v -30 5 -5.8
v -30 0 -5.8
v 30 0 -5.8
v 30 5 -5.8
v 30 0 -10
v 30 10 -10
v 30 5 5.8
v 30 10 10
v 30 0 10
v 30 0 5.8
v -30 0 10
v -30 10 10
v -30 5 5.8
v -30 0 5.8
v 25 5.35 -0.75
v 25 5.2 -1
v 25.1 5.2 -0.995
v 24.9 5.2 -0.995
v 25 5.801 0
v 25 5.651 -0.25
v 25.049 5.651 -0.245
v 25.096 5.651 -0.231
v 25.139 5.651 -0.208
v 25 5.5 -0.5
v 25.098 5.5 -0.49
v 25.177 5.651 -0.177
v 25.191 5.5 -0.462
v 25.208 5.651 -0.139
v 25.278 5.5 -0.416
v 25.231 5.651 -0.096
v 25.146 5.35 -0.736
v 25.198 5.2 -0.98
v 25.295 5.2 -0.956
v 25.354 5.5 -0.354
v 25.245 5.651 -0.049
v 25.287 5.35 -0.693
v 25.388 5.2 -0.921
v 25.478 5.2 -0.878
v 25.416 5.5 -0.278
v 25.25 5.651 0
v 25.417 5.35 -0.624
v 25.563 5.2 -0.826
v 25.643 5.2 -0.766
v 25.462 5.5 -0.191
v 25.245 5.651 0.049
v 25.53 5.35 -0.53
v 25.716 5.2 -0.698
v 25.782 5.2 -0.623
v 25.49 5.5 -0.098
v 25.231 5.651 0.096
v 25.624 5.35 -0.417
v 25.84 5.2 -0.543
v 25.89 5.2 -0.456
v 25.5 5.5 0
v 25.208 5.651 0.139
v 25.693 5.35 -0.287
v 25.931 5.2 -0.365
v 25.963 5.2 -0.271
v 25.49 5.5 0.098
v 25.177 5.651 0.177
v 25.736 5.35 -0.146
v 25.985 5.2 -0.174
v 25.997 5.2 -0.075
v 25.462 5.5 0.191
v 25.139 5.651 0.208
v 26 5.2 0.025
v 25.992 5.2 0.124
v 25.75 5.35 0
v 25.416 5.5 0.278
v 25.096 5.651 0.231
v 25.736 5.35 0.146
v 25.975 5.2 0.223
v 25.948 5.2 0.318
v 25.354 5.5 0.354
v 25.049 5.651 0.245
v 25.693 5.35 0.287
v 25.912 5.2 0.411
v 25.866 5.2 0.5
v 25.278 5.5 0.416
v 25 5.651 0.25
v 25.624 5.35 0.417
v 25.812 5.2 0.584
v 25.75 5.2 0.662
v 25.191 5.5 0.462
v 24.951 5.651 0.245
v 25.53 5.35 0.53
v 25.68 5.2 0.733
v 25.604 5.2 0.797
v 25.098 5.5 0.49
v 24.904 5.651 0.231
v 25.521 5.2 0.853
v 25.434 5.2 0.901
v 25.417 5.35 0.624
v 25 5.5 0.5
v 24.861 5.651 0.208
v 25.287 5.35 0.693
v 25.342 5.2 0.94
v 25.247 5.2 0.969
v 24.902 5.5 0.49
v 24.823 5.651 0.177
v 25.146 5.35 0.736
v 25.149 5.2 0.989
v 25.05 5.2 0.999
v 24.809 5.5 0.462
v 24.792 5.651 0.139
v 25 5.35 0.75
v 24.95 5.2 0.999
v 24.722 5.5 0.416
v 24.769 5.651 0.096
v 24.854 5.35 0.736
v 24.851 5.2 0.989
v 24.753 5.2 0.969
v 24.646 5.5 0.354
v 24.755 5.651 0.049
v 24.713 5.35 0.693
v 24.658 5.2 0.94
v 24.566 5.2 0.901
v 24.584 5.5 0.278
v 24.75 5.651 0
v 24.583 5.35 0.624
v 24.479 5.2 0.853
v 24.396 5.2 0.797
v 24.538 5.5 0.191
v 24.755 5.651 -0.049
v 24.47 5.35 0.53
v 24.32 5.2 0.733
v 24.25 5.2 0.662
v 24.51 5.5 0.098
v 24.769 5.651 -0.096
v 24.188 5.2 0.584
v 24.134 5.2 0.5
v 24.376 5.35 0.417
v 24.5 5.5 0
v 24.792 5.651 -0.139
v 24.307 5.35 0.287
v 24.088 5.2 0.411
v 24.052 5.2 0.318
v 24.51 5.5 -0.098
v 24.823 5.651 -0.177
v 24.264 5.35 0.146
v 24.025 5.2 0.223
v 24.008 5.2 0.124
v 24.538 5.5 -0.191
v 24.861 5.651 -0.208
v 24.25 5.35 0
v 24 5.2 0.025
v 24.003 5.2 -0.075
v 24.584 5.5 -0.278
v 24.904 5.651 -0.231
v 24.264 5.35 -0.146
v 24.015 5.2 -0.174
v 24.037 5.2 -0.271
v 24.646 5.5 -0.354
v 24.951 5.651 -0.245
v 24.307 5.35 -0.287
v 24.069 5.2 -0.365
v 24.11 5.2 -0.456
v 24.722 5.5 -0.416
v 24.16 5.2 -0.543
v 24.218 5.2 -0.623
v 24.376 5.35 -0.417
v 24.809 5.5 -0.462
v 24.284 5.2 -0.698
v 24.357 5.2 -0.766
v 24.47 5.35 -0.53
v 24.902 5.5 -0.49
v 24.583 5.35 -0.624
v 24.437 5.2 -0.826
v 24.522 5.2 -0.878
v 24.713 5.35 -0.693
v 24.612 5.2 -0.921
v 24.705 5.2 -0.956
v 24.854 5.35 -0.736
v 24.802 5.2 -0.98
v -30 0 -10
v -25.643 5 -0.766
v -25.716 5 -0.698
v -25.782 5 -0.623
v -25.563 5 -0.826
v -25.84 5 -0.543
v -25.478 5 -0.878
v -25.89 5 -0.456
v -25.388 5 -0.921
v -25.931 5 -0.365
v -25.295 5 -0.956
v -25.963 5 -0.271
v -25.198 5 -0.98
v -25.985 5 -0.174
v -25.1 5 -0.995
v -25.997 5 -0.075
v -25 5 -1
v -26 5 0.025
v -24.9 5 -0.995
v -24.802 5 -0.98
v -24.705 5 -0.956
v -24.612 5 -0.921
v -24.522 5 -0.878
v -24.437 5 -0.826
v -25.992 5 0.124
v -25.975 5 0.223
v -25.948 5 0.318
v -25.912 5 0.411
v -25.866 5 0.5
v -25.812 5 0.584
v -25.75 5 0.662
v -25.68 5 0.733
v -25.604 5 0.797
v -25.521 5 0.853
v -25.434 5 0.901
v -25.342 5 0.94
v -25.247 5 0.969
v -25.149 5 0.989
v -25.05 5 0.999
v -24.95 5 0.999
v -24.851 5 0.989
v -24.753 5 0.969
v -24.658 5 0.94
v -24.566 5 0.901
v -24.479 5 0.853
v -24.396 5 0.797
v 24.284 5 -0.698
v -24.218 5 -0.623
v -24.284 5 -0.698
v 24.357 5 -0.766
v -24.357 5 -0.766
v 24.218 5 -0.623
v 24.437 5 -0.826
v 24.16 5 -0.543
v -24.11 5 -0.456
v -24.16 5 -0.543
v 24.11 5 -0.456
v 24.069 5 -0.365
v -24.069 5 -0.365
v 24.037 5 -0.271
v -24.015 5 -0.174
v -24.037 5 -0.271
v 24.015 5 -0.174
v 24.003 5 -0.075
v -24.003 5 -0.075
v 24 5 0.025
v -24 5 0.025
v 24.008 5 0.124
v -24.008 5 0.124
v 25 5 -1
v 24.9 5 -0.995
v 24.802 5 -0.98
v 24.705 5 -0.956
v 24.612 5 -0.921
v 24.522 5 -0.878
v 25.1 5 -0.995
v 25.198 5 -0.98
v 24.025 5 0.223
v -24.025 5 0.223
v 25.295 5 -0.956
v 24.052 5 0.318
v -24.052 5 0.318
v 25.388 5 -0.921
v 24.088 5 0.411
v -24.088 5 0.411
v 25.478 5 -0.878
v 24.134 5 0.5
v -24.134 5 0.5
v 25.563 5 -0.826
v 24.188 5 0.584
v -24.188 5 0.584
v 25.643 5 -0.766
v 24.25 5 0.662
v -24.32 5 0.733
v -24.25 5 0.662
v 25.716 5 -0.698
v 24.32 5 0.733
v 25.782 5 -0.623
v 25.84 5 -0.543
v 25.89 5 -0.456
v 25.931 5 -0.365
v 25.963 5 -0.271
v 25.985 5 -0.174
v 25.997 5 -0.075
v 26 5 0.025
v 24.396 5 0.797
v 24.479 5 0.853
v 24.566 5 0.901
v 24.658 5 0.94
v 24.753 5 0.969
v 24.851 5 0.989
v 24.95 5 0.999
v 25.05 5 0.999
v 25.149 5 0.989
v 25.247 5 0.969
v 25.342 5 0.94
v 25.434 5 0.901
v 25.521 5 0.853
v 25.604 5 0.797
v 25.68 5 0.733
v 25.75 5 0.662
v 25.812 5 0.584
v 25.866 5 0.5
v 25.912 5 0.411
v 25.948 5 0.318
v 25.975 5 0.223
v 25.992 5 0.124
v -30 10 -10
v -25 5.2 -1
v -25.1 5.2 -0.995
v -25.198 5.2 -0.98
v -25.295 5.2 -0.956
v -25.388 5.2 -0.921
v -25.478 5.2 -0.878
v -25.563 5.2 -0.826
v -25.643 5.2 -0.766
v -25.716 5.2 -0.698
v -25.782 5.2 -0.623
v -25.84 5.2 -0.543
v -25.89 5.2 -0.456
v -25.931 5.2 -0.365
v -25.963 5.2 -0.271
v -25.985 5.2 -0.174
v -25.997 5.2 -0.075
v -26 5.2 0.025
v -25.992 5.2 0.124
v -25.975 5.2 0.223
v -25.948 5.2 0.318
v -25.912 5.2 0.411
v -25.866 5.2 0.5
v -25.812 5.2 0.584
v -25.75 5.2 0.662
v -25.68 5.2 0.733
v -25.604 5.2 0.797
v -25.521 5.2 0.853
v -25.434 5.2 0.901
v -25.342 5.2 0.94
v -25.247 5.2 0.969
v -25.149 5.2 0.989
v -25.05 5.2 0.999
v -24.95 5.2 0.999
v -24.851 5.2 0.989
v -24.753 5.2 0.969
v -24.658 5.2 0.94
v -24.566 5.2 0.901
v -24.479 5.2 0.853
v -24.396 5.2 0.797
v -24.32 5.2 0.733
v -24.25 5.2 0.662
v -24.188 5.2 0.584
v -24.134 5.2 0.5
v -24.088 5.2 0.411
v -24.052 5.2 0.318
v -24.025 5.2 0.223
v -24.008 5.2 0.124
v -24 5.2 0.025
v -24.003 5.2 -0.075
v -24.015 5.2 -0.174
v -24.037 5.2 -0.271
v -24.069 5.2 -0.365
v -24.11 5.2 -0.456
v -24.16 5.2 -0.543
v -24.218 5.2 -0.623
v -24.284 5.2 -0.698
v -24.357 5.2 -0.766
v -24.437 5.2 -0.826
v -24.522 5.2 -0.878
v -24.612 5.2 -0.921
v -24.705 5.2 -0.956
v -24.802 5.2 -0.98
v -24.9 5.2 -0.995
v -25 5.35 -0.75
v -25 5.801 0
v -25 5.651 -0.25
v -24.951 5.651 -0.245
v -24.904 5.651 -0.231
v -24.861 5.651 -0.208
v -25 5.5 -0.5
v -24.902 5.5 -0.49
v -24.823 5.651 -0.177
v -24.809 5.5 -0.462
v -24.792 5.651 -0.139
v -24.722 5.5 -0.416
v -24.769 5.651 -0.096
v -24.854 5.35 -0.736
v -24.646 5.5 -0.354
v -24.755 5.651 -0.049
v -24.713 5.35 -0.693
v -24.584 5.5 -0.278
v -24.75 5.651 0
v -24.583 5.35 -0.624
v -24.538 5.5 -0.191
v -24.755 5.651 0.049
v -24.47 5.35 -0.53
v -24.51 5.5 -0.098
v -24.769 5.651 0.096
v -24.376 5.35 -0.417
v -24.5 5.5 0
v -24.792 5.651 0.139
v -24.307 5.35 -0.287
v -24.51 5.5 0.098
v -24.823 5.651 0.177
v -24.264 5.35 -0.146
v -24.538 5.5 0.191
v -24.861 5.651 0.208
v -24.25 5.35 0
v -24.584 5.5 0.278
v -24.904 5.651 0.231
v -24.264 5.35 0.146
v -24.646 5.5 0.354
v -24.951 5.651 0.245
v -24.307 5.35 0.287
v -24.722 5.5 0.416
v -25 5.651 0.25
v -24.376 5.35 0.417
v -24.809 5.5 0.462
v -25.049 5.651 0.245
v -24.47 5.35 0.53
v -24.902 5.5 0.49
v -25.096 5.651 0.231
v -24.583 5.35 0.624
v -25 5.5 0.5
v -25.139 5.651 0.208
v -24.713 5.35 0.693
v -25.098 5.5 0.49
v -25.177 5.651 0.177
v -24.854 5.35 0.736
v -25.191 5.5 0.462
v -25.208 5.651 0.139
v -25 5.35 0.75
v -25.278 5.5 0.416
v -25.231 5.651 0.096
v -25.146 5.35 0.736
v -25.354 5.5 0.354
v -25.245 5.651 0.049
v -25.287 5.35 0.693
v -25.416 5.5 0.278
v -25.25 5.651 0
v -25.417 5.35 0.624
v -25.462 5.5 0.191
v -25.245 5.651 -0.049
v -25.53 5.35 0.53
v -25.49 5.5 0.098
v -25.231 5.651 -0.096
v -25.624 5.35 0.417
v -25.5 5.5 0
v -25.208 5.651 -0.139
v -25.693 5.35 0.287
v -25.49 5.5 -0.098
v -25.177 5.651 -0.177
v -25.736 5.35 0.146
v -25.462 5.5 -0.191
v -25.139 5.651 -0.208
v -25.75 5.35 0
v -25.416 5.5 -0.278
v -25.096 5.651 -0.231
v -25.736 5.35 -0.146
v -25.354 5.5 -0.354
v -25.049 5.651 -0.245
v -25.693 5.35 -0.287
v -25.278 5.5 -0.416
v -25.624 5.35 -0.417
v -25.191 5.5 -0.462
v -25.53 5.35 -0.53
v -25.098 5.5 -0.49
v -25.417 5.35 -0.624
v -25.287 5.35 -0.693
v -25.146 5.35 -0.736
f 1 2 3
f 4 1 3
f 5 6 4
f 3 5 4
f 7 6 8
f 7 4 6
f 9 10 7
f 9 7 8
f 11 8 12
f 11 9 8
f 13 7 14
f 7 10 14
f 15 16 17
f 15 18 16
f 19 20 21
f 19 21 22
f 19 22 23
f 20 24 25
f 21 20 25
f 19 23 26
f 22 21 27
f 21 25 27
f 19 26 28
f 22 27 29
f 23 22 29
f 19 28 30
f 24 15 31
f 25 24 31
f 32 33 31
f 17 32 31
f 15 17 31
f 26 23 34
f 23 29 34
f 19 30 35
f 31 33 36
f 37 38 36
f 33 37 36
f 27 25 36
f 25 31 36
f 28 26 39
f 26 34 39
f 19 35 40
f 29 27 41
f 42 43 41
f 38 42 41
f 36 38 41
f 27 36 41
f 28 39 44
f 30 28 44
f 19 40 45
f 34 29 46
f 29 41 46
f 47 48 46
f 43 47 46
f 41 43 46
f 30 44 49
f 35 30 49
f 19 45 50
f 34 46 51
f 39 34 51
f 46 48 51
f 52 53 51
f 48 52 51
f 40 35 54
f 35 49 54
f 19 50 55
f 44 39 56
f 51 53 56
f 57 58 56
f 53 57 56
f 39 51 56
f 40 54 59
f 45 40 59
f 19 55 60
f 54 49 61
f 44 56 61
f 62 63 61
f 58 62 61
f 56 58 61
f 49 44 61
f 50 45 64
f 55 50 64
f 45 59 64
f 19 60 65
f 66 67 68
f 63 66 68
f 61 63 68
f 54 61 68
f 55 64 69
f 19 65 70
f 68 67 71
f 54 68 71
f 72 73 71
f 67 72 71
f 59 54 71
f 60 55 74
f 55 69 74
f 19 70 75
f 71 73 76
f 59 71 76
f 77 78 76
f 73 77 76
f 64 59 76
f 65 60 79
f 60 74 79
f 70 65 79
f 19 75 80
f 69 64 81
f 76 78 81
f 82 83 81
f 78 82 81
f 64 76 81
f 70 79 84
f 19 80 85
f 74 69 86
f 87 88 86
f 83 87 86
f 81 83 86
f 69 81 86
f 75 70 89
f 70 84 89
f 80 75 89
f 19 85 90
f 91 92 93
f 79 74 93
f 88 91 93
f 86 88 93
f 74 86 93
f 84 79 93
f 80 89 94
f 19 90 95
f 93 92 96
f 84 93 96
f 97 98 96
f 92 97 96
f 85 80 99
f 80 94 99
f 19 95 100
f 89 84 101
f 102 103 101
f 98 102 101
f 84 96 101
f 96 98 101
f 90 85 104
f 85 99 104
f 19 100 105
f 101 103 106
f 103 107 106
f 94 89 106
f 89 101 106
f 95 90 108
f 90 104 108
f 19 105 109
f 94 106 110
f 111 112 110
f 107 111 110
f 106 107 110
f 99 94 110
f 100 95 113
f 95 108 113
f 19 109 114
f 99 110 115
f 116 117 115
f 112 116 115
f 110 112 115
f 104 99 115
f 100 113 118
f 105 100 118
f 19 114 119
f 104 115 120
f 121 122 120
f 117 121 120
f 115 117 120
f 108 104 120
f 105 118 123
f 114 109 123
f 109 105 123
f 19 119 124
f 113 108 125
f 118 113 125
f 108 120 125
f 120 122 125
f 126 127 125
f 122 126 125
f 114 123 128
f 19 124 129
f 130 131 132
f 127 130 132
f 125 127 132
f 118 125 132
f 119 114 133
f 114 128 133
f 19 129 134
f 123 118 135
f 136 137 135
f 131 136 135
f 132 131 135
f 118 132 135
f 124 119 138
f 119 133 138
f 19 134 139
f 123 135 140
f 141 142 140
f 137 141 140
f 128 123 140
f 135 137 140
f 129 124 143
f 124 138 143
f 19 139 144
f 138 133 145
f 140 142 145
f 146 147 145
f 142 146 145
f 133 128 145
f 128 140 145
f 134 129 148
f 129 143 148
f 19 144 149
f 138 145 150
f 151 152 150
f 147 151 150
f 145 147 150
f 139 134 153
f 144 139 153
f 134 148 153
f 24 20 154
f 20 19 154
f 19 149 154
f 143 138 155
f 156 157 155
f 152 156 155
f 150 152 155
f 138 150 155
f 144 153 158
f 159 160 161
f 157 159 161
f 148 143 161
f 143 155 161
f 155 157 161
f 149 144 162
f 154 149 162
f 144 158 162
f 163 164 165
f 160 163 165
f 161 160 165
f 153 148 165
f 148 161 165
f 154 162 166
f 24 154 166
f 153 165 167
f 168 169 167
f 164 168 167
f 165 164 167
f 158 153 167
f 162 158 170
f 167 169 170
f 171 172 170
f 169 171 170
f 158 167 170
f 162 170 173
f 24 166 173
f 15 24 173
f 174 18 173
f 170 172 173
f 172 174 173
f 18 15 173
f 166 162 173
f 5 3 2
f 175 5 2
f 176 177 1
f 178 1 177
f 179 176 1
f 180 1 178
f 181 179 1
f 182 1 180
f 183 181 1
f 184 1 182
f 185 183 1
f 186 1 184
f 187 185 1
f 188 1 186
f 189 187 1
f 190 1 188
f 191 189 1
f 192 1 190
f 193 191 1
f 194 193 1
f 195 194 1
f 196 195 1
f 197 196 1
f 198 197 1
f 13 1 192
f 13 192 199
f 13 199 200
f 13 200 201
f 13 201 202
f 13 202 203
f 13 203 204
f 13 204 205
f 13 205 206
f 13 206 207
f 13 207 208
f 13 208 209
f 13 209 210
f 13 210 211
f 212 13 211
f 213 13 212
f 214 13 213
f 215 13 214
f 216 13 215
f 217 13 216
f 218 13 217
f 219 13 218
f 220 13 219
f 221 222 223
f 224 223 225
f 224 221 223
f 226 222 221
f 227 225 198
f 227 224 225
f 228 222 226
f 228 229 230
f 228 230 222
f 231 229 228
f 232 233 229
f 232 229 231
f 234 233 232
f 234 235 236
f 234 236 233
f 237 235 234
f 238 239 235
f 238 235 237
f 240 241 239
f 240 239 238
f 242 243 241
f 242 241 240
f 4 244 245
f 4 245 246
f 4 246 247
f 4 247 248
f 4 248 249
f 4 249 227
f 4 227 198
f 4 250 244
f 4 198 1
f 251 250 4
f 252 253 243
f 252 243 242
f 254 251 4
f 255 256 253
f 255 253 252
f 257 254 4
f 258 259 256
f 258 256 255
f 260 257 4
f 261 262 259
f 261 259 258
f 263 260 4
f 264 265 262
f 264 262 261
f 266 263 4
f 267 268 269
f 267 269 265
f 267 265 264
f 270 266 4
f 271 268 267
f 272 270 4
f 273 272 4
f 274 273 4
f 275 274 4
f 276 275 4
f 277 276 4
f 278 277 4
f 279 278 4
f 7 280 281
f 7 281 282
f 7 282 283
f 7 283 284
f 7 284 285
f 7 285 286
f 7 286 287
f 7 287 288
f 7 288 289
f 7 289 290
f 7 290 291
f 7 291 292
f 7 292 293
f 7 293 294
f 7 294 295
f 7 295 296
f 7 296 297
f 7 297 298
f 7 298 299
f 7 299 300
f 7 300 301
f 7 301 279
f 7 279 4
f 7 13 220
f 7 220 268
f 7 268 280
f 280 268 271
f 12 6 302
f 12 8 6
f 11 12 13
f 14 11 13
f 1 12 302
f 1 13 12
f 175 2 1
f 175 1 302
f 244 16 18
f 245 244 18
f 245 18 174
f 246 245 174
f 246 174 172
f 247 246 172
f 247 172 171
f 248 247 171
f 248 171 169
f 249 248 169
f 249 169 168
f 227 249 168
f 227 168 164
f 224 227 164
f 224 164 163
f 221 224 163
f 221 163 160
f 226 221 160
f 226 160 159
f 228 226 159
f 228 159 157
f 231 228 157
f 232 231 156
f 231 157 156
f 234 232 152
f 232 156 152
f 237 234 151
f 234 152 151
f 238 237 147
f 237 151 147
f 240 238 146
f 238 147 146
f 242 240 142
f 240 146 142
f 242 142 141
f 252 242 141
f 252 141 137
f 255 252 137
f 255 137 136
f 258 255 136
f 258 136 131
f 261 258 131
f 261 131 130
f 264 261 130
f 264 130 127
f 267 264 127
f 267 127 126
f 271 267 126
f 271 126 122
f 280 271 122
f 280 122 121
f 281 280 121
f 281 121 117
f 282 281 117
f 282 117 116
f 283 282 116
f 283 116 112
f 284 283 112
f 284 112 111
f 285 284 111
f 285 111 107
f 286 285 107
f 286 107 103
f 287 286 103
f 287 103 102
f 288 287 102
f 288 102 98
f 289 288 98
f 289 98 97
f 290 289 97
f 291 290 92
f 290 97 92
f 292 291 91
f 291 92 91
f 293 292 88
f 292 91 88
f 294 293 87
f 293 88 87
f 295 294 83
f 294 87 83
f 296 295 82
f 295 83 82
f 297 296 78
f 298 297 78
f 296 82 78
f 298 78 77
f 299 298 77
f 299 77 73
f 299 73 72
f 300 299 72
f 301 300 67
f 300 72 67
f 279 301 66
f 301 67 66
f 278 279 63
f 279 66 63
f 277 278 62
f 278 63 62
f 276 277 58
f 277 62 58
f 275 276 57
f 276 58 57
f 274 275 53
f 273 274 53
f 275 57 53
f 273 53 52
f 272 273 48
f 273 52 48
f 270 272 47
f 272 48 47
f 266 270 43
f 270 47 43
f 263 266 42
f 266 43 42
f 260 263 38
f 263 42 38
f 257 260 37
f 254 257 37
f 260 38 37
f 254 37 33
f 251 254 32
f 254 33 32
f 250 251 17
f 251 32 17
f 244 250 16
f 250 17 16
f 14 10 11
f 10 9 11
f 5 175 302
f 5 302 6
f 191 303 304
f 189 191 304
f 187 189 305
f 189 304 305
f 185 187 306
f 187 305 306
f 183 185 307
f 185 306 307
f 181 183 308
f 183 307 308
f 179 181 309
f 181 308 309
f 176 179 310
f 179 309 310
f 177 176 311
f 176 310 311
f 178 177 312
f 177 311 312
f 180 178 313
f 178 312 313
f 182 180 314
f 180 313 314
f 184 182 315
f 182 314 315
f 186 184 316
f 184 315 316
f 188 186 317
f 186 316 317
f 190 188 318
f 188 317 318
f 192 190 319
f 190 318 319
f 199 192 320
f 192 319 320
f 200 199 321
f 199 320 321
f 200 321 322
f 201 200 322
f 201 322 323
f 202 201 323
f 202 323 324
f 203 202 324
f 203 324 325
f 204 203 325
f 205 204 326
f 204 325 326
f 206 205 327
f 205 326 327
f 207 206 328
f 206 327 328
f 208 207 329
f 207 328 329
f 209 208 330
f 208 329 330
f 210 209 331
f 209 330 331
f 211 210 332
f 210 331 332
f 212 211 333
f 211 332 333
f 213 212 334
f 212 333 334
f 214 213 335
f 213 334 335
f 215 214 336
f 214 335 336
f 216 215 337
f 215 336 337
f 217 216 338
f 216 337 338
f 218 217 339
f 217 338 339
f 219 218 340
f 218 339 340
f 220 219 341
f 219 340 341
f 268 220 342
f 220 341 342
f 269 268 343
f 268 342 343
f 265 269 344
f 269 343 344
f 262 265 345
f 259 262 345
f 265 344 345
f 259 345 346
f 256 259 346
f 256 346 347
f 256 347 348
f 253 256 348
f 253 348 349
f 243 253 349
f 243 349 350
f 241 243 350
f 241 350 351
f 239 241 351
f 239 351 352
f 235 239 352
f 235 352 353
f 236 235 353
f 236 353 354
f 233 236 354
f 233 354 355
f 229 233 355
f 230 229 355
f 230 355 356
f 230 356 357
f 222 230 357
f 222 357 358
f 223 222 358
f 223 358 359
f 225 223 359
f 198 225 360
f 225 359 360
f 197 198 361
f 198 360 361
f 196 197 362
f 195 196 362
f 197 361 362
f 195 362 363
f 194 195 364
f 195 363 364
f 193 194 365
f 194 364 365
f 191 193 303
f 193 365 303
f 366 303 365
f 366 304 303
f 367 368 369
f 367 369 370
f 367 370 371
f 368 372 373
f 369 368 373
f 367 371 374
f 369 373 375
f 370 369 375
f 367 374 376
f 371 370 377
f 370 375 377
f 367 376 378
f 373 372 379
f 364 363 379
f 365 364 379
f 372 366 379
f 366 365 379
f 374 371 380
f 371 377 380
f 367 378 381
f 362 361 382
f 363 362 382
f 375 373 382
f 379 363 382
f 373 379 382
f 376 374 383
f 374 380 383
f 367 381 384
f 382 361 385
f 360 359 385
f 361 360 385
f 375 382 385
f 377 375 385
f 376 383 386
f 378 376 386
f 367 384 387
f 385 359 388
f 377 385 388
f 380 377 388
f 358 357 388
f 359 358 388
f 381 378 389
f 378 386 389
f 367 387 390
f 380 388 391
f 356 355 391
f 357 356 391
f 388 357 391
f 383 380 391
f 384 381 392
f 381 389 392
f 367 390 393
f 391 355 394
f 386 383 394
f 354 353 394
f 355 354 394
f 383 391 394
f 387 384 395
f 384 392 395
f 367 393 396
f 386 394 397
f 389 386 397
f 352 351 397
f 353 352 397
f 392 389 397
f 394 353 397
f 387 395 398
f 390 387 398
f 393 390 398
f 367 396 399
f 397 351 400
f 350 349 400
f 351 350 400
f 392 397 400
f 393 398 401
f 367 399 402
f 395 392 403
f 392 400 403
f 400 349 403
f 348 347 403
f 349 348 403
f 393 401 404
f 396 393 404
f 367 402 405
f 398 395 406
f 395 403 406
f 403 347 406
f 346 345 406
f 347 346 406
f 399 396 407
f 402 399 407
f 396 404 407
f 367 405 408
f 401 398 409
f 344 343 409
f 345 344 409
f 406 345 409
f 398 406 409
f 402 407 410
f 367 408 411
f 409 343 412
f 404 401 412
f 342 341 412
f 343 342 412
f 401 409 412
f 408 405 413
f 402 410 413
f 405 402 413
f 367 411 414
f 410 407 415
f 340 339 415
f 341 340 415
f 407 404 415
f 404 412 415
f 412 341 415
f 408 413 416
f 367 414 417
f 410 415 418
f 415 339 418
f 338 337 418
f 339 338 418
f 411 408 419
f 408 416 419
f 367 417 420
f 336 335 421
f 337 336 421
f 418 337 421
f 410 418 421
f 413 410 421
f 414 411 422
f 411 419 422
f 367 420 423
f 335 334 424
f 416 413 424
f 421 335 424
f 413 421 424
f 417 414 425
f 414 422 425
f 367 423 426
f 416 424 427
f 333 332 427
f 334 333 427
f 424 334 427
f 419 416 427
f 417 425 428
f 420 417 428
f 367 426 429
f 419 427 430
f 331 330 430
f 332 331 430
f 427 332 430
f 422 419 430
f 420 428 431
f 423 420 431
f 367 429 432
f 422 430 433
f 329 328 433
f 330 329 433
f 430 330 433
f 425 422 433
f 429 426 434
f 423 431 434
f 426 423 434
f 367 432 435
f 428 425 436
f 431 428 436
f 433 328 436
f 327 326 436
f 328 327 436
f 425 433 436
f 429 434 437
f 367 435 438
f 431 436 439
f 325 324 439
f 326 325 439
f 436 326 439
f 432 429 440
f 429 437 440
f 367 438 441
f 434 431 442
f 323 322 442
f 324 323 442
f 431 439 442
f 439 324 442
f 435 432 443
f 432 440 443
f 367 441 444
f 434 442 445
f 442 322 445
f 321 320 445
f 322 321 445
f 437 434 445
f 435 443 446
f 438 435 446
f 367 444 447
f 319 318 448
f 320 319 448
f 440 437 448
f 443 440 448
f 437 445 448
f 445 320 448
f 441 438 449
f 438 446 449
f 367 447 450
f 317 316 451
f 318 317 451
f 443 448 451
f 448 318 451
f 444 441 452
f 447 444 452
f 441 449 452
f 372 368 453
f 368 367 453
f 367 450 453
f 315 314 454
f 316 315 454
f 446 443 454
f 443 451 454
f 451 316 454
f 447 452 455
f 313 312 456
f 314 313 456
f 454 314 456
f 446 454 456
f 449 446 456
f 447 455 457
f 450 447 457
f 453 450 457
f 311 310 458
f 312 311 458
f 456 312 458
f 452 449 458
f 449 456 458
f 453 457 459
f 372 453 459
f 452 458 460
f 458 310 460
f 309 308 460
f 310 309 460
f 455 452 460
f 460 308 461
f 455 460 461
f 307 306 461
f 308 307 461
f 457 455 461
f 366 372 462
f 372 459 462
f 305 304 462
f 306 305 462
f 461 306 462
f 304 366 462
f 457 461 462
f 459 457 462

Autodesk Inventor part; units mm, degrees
ref_plane "YZ Plane" through (0, 0, 0) normal (1, 0, 0) x (0, 1, 0)
ref_plane "XZ Plane" through (0, 0, 0) normal (0, 1, 0) x (-1, 0, 0)
ref_plane "XY Plane" through (0, 0, 0) normal (0, 0, 1) x (1, 0, 0)
sketch "スケッチ1" plane through (0, 0, 0) normal (0, 1, 0) x (-1, 0, 0)
  line L0 (30, -10) -> (-30, -10)
  line L1 (-30, -10) -> (-30, 10)
  line L2 (-30, 10) -> (30, 10)
  line L3 (30, 10) -> (30, -10)
  line L4 (30, -10) -> (-30, 10) construction
  line L5 (30, 10) -> (-30, -10) construction
  point P0 (0, 0)
  point P1 (0, 0)
  dimension "d0" = 60
  dimension "d1" = 20
extrude "押し出し1" add sketch "スケッチ1" along normal blind 10
sketch "スケッチ3" plane through (0, 0, 0) normal (0, -1, 0) x (1, 0, 0)
  line L0 (30, 5.8) -> (-30, 5.8)
  line L1 (-30, 5.8) -> (-30, -5.8)
  line L2 (-30, -5.8) -> (30, -5.8)
  line L3 (30, -5.8) -> (30, 5.8)
  line L4 (30, 10) -> (30, -10) projected
  line L5 (-30, -10) -> (-30, 10) projected
  line L6 (30, 5.8) -> (-30, -5.8) construction
  point P0 (0, 0)
  point P1 (0, 0)
  dimension "d12" = 11.6
extrude "押し出し2" cut sketch "スケッチ3" against normal blind 5
sketch "スケッチ4" plane through (0, 5, 0) normal (0, -1, 0) x (1, 0, 0)
  line L0 (-25, 0) -> (25, 0) construction
  point P0 (0, 0)
  point P1 (0, 0)
  dimension "d15" = 50
hole "穴2" at (-25, 5, 0) at (25, 5, 0) direction (0, 1, 0) diameter 2 depth 0.2 tip angle 118
ref_plane "作業平面1" through (0, 0, 10) normal (-1, 0, 0) x (0, 0, 1)
ref_plane "作業平面2" through (-30, 0, 0) normal (0, 0, 1) x (1, 0, 0)
ref_plane "作業平面3" through (0, 5, 0) normal (0, -1, 0) x (1, 0, 0)
properties part number "forkmount" material "ABS プラスチック"
